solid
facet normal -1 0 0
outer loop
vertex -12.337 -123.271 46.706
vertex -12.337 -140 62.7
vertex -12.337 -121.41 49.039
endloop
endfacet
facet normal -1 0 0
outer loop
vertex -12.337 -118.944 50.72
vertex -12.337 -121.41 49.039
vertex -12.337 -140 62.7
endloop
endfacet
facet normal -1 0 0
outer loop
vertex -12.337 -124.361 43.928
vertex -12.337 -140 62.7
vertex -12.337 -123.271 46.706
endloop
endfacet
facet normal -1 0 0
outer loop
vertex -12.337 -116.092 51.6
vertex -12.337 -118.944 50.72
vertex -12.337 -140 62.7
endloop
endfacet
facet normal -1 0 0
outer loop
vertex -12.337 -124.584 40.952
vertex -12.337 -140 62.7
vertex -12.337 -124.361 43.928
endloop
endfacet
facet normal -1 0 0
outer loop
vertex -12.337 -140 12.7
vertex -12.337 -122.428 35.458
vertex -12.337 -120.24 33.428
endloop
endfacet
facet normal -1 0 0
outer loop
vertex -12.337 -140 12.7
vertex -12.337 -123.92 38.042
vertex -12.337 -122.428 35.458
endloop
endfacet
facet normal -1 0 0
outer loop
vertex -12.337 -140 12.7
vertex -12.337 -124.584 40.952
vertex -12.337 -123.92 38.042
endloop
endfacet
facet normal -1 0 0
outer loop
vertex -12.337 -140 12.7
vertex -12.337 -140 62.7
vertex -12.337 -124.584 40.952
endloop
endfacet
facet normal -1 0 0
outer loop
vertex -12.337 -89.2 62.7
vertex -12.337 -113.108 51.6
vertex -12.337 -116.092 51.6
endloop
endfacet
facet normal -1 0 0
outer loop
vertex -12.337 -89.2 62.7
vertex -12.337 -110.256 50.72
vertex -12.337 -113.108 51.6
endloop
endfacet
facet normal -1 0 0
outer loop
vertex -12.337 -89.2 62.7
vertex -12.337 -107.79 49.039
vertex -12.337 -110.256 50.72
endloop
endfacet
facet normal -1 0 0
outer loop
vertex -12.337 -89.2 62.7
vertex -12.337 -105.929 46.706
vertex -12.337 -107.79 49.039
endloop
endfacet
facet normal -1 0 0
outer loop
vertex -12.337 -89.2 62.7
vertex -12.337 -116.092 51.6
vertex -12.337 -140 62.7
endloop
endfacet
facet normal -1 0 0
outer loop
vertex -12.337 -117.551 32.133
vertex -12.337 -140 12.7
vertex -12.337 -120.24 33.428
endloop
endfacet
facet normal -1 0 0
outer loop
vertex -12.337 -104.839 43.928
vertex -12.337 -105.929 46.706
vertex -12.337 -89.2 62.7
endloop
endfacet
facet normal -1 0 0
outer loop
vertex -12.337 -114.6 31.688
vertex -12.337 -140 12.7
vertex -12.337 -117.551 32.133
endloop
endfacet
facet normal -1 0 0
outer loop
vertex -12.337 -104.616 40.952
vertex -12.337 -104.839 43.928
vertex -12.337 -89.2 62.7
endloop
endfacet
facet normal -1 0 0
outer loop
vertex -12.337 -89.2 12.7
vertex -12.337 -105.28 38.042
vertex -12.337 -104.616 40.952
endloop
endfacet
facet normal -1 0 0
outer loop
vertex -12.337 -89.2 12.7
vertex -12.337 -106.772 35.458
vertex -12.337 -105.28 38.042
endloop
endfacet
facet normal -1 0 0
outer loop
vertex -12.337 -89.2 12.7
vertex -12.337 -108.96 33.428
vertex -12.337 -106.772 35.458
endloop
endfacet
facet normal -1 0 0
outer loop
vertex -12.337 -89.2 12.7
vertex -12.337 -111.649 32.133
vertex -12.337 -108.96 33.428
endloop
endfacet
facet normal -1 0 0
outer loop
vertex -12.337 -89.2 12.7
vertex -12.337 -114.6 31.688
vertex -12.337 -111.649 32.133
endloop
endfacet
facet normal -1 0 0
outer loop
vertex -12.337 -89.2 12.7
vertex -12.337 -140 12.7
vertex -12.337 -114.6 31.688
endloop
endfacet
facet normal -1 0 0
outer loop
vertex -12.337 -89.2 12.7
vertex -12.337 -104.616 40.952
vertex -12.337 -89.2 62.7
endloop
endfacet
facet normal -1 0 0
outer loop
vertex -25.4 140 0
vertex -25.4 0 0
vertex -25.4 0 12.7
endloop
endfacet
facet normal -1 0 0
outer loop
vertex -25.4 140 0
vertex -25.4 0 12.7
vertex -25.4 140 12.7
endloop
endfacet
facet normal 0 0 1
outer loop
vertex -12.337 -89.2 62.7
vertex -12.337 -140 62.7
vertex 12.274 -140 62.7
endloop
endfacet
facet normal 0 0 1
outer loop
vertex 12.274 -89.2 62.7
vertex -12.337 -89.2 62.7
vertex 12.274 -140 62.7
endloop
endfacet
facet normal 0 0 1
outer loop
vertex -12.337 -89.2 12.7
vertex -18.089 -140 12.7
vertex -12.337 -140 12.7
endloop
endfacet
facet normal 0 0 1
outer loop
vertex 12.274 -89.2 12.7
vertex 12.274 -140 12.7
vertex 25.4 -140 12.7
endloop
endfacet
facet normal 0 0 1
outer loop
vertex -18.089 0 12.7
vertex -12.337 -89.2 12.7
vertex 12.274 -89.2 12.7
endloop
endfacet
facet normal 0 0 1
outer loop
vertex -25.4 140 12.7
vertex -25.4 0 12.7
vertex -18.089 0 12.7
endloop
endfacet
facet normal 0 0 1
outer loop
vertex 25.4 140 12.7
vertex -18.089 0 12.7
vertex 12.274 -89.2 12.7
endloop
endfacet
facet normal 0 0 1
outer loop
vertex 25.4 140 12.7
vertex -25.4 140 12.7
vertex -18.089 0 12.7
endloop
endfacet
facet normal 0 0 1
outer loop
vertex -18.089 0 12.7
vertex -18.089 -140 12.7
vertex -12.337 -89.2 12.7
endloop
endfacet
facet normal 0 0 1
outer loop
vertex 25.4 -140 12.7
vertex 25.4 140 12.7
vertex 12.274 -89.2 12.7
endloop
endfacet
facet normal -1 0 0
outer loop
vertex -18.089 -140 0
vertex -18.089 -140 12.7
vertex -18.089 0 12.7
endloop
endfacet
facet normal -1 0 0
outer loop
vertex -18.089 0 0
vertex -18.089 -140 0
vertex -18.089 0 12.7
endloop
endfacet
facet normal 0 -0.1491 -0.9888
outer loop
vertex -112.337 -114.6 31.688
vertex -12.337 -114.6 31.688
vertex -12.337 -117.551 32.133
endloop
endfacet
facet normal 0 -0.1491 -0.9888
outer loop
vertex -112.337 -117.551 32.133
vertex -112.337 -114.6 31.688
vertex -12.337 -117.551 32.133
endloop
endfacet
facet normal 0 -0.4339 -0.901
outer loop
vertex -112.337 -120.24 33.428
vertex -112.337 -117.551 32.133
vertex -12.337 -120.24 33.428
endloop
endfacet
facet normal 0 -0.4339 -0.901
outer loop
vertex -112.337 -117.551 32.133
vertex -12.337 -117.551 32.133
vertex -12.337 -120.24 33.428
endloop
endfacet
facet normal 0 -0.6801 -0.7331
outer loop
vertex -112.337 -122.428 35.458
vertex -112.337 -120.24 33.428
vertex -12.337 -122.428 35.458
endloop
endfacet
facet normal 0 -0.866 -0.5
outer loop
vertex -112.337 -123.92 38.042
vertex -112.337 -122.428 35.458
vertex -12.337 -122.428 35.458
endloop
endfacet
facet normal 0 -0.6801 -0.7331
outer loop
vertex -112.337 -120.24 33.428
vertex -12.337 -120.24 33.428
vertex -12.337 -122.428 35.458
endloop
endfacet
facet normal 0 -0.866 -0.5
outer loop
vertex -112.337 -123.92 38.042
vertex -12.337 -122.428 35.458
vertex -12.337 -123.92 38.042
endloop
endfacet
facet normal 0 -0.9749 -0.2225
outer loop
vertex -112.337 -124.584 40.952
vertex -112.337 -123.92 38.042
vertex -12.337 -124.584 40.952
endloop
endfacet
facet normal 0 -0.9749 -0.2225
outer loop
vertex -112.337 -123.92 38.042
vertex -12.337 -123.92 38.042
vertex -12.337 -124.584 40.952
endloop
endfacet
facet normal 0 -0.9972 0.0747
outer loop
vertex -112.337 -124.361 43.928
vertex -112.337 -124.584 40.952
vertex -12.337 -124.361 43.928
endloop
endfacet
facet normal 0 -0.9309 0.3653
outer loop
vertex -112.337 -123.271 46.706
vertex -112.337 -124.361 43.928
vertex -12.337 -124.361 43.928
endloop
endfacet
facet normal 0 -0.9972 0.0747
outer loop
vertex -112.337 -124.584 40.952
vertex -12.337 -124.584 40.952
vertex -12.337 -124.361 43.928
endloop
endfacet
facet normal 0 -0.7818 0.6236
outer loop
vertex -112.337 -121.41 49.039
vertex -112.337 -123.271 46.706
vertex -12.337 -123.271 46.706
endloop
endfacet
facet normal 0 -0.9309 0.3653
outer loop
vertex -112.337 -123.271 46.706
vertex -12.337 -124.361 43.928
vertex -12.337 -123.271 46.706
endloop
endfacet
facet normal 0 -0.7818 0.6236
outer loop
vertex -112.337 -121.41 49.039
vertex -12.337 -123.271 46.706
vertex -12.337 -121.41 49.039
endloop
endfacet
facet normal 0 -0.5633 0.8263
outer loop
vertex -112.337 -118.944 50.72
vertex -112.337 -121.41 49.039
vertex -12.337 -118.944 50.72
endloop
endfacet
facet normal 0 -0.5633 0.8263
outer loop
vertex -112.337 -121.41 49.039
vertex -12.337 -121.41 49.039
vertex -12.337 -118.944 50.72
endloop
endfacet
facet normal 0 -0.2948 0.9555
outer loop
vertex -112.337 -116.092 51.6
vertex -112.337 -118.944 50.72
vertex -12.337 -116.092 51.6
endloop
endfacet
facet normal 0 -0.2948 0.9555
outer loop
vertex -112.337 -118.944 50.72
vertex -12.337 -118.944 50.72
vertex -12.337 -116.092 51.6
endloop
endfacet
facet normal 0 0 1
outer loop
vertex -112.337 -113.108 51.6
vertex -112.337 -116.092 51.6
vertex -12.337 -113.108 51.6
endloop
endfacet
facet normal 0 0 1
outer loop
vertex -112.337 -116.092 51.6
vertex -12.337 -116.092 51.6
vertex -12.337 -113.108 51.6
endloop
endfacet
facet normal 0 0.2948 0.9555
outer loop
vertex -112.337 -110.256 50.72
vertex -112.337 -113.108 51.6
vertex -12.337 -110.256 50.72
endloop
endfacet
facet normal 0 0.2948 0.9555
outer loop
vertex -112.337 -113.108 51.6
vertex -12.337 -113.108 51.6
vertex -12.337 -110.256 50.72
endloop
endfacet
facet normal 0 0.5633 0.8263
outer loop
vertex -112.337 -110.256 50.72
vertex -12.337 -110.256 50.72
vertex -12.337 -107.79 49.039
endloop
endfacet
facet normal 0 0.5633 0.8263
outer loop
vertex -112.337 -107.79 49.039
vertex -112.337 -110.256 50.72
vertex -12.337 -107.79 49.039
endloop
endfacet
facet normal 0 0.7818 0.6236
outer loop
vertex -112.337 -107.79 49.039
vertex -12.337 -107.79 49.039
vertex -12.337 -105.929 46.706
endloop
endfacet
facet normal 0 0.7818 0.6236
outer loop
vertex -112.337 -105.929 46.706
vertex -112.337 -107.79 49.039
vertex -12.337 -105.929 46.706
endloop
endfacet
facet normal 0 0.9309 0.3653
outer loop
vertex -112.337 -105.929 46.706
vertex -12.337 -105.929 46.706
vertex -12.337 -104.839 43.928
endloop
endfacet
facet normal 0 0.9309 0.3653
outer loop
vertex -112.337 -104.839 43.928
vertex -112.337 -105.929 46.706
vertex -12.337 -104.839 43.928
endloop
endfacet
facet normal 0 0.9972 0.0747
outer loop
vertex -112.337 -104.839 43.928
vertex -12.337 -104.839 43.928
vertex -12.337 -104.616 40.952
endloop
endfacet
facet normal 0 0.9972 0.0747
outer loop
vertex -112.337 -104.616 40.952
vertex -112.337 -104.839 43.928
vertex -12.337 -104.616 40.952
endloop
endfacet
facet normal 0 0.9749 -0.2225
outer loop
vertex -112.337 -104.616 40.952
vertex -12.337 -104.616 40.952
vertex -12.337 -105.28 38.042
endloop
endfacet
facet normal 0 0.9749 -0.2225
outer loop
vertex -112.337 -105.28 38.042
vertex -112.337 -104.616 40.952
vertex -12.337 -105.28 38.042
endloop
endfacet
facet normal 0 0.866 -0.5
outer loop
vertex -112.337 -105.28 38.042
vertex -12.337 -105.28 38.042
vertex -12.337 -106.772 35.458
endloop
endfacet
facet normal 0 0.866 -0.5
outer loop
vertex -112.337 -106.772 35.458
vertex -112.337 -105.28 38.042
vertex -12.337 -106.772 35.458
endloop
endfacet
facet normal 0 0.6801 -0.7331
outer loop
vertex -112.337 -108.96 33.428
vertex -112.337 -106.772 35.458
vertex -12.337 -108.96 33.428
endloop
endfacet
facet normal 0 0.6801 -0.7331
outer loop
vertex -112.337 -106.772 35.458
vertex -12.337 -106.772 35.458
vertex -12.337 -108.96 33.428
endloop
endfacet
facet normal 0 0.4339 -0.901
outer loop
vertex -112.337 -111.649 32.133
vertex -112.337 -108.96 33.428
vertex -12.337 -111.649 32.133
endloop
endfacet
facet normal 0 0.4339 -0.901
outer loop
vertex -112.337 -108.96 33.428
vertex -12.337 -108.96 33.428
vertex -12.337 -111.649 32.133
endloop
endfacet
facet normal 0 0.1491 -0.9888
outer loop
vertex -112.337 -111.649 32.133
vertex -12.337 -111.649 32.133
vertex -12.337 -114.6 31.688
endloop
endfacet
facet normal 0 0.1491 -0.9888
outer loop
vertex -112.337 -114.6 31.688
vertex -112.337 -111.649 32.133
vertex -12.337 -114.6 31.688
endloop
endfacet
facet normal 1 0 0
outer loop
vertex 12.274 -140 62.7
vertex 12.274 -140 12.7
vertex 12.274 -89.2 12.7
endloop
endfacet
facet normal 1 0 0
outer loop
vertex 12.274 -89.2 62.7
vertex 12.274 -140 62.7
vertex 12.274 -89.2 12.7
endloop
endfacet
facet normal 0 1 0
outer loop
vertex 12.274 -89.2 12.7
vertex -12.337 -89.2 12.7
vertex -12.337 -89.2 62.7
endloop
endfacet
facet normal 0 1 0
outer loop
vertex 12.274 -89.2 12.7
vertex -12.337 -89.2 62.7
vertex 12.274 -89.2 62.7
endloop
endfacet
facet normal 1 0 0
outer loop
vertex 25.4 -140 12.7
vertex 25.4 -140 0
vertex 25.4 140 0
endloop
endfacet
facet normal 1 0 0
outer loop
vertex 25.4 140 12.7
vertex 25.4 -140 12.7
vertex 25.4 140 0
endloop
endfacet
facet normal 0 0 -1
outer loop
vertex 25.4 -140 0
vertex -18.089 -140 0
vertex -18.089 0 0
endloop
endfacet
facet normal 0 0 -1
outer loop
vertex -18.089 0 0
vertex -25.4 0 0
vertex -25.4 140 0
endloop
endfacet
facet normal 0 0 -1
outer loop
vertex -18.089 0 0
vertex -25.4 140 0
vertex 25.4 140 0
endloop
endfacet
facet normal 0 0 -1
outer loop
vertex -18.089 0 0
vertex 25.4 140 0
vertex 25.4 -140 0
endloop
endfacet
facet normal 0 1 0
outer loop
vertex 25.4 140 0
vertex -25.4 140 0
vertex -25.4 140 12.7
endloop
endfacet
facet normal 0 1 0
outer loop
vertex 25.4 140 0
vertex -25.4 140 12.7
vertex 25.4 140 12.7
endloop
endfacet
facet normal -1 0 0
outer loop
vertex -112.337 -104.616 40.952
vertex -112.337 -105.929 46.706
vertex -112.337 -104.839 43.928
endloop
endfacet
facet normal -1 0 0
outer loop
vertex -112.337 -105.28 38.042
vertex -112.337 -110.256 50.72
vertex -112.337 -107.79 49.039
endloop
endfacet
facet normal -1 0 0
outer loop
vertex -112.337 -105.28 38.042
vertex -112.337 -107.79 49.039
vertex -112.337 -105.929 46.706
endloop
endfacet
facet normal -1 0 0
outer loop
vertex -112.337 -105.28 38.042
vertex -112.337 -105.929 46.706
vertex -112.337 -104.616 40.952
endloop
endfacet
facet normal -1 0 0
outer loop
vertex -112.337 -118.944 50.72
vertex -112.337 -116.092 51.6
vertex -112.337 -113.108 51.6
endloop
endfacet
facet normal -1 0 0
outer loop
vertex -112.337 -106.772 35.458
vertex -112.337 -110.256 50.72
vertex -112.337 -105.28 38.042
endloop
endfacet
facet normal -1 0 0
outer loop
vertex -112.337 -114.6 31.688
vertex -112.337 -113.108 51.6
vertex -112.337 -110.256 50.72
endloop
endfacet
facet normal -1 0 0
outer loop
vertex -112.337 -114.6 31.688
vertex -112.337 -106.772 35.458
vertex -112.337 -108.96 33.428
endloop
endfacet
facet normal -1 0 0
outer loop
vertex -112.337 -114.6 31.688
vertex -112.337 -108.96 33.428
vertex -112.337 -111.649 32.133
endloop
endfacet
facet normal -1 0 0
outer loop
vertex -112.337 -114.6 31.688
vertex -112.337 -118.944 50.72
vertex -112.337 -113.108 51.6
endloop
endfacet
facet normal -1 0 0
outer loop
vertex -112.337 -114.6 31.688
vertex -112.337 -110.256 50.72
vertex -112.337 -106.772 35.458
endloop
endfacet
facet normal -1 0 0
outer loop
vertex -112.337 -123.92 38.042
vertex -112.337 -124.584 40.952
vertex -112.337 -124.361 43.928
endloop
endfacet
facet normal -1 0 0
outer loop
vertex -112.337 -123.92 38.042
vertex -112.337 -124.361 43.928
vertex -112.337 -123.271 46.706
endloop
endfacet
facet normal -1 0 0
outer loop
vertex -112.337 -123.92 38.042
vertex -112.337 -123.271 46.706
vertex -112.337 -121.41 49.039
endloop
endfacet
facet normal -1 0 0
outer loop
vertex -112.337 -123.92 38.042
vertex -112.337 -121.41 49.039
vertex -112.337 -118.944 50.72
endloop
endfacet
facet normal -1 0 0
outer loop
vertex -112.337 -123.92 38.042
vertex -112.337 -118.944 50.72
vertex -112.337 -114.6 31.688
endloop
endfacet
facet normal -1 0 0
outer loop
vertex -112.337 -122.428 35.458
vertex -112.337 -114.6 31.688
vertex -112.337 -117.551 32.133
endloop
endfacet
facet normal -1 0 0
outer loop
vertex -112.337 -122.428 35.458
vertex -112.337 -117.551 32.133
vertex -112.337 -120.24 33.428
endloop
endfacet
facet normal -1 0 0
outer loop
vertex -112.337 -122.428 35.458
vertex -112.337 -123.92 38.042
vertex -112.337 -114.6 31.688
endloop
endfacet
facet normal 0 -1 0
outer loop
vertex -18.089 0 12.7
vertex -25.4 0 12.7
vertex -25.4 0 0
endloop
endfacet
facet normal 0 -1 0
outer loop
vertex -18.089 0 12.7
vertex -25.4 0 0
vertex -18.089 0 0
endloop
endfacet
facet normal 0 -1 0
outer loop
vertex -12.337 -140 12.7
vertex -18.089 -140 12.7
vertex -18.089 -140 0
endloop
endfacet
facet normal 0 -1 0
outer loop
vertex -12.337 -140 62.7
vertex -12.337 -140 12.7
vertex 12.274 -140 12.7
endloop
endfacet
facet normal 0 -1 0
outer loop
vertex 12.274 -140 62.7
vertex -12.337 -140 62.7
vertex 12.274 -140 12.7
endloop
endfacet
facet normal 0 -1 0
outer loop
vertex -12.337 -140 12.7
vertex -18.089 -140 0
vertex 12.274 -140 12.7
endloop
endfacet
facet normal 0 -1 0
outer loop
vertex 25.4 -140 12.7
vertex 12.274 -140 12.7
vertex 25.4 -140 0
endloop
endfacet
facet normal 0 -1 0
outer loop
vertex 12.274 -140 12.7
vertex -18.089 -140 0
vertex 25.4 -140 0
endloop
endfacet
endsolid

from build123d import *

# Parameters (mm, degrees)
CROQUIS1_W              = 50.8
CROQUIS1_H              = 280
SALIENTE_EXTRUIR1_DEPTH = 12.7
CROQUIS2_W              = 24.610386892
CROQUIS2_H              = 50.8
SALIENTE_EXTRUIR2_DEPTH = 50
CROQUIS4_R              = 10.011889378
SALIENTE_EXTRUIR3_DEPTH = 100
CROQUIS5_W              = 7.310893966
CROQUIS5_H              = 140
CORTAR_EXTRUIR1_DEPTH   = 187.331823837


with BuildPart() as part:
    # Croquis1 → Saliente-Extruir1 (new body)
    with BuildSketch(Plane.XY):
        Rectangle(CROQUIS1_W, CROQUIS1_H)
    extrude(amount=SALIENTE_EXTRUIR1_DEPTH)

    # Croquis2 → Saliente-Extruir2 (add)
    with BuildSketch(Plane.XY.offset(12.7)):
        with Locations((-0.031570681, -114.6)):
            Rectangle(CROQUIS2_W, CROQUIS2_H)
    extrude(amount=SALIENTE_EXTRUIR2_DEPTH)

    # Croquis4 → Saliente-Extruir3 (add)
    with BuildSketch(Plane.ZY.offset(12.336764127)):
        with Locations(Location((41.7, -114.6, 0), (0, 0, 180))):
            Circle(CROQUIS4_R)
    extrude(amount=SALIENTE_EXTRUIR3_DEPTH)

    # Croquis5 → Cortar-Extruir1 (cut, through all)
    with BuildSketch(Plane.XY.offset(12.7)):
        with Locations((-21.744553017, -70)):
            Rectangle(CROQUIS5_W, CROQUIS5_H)
    extrude(amount=-CORTAR_EXTRUIR1_DEPTH, mode=Mode.SUBTRACT)


solid = part.part
